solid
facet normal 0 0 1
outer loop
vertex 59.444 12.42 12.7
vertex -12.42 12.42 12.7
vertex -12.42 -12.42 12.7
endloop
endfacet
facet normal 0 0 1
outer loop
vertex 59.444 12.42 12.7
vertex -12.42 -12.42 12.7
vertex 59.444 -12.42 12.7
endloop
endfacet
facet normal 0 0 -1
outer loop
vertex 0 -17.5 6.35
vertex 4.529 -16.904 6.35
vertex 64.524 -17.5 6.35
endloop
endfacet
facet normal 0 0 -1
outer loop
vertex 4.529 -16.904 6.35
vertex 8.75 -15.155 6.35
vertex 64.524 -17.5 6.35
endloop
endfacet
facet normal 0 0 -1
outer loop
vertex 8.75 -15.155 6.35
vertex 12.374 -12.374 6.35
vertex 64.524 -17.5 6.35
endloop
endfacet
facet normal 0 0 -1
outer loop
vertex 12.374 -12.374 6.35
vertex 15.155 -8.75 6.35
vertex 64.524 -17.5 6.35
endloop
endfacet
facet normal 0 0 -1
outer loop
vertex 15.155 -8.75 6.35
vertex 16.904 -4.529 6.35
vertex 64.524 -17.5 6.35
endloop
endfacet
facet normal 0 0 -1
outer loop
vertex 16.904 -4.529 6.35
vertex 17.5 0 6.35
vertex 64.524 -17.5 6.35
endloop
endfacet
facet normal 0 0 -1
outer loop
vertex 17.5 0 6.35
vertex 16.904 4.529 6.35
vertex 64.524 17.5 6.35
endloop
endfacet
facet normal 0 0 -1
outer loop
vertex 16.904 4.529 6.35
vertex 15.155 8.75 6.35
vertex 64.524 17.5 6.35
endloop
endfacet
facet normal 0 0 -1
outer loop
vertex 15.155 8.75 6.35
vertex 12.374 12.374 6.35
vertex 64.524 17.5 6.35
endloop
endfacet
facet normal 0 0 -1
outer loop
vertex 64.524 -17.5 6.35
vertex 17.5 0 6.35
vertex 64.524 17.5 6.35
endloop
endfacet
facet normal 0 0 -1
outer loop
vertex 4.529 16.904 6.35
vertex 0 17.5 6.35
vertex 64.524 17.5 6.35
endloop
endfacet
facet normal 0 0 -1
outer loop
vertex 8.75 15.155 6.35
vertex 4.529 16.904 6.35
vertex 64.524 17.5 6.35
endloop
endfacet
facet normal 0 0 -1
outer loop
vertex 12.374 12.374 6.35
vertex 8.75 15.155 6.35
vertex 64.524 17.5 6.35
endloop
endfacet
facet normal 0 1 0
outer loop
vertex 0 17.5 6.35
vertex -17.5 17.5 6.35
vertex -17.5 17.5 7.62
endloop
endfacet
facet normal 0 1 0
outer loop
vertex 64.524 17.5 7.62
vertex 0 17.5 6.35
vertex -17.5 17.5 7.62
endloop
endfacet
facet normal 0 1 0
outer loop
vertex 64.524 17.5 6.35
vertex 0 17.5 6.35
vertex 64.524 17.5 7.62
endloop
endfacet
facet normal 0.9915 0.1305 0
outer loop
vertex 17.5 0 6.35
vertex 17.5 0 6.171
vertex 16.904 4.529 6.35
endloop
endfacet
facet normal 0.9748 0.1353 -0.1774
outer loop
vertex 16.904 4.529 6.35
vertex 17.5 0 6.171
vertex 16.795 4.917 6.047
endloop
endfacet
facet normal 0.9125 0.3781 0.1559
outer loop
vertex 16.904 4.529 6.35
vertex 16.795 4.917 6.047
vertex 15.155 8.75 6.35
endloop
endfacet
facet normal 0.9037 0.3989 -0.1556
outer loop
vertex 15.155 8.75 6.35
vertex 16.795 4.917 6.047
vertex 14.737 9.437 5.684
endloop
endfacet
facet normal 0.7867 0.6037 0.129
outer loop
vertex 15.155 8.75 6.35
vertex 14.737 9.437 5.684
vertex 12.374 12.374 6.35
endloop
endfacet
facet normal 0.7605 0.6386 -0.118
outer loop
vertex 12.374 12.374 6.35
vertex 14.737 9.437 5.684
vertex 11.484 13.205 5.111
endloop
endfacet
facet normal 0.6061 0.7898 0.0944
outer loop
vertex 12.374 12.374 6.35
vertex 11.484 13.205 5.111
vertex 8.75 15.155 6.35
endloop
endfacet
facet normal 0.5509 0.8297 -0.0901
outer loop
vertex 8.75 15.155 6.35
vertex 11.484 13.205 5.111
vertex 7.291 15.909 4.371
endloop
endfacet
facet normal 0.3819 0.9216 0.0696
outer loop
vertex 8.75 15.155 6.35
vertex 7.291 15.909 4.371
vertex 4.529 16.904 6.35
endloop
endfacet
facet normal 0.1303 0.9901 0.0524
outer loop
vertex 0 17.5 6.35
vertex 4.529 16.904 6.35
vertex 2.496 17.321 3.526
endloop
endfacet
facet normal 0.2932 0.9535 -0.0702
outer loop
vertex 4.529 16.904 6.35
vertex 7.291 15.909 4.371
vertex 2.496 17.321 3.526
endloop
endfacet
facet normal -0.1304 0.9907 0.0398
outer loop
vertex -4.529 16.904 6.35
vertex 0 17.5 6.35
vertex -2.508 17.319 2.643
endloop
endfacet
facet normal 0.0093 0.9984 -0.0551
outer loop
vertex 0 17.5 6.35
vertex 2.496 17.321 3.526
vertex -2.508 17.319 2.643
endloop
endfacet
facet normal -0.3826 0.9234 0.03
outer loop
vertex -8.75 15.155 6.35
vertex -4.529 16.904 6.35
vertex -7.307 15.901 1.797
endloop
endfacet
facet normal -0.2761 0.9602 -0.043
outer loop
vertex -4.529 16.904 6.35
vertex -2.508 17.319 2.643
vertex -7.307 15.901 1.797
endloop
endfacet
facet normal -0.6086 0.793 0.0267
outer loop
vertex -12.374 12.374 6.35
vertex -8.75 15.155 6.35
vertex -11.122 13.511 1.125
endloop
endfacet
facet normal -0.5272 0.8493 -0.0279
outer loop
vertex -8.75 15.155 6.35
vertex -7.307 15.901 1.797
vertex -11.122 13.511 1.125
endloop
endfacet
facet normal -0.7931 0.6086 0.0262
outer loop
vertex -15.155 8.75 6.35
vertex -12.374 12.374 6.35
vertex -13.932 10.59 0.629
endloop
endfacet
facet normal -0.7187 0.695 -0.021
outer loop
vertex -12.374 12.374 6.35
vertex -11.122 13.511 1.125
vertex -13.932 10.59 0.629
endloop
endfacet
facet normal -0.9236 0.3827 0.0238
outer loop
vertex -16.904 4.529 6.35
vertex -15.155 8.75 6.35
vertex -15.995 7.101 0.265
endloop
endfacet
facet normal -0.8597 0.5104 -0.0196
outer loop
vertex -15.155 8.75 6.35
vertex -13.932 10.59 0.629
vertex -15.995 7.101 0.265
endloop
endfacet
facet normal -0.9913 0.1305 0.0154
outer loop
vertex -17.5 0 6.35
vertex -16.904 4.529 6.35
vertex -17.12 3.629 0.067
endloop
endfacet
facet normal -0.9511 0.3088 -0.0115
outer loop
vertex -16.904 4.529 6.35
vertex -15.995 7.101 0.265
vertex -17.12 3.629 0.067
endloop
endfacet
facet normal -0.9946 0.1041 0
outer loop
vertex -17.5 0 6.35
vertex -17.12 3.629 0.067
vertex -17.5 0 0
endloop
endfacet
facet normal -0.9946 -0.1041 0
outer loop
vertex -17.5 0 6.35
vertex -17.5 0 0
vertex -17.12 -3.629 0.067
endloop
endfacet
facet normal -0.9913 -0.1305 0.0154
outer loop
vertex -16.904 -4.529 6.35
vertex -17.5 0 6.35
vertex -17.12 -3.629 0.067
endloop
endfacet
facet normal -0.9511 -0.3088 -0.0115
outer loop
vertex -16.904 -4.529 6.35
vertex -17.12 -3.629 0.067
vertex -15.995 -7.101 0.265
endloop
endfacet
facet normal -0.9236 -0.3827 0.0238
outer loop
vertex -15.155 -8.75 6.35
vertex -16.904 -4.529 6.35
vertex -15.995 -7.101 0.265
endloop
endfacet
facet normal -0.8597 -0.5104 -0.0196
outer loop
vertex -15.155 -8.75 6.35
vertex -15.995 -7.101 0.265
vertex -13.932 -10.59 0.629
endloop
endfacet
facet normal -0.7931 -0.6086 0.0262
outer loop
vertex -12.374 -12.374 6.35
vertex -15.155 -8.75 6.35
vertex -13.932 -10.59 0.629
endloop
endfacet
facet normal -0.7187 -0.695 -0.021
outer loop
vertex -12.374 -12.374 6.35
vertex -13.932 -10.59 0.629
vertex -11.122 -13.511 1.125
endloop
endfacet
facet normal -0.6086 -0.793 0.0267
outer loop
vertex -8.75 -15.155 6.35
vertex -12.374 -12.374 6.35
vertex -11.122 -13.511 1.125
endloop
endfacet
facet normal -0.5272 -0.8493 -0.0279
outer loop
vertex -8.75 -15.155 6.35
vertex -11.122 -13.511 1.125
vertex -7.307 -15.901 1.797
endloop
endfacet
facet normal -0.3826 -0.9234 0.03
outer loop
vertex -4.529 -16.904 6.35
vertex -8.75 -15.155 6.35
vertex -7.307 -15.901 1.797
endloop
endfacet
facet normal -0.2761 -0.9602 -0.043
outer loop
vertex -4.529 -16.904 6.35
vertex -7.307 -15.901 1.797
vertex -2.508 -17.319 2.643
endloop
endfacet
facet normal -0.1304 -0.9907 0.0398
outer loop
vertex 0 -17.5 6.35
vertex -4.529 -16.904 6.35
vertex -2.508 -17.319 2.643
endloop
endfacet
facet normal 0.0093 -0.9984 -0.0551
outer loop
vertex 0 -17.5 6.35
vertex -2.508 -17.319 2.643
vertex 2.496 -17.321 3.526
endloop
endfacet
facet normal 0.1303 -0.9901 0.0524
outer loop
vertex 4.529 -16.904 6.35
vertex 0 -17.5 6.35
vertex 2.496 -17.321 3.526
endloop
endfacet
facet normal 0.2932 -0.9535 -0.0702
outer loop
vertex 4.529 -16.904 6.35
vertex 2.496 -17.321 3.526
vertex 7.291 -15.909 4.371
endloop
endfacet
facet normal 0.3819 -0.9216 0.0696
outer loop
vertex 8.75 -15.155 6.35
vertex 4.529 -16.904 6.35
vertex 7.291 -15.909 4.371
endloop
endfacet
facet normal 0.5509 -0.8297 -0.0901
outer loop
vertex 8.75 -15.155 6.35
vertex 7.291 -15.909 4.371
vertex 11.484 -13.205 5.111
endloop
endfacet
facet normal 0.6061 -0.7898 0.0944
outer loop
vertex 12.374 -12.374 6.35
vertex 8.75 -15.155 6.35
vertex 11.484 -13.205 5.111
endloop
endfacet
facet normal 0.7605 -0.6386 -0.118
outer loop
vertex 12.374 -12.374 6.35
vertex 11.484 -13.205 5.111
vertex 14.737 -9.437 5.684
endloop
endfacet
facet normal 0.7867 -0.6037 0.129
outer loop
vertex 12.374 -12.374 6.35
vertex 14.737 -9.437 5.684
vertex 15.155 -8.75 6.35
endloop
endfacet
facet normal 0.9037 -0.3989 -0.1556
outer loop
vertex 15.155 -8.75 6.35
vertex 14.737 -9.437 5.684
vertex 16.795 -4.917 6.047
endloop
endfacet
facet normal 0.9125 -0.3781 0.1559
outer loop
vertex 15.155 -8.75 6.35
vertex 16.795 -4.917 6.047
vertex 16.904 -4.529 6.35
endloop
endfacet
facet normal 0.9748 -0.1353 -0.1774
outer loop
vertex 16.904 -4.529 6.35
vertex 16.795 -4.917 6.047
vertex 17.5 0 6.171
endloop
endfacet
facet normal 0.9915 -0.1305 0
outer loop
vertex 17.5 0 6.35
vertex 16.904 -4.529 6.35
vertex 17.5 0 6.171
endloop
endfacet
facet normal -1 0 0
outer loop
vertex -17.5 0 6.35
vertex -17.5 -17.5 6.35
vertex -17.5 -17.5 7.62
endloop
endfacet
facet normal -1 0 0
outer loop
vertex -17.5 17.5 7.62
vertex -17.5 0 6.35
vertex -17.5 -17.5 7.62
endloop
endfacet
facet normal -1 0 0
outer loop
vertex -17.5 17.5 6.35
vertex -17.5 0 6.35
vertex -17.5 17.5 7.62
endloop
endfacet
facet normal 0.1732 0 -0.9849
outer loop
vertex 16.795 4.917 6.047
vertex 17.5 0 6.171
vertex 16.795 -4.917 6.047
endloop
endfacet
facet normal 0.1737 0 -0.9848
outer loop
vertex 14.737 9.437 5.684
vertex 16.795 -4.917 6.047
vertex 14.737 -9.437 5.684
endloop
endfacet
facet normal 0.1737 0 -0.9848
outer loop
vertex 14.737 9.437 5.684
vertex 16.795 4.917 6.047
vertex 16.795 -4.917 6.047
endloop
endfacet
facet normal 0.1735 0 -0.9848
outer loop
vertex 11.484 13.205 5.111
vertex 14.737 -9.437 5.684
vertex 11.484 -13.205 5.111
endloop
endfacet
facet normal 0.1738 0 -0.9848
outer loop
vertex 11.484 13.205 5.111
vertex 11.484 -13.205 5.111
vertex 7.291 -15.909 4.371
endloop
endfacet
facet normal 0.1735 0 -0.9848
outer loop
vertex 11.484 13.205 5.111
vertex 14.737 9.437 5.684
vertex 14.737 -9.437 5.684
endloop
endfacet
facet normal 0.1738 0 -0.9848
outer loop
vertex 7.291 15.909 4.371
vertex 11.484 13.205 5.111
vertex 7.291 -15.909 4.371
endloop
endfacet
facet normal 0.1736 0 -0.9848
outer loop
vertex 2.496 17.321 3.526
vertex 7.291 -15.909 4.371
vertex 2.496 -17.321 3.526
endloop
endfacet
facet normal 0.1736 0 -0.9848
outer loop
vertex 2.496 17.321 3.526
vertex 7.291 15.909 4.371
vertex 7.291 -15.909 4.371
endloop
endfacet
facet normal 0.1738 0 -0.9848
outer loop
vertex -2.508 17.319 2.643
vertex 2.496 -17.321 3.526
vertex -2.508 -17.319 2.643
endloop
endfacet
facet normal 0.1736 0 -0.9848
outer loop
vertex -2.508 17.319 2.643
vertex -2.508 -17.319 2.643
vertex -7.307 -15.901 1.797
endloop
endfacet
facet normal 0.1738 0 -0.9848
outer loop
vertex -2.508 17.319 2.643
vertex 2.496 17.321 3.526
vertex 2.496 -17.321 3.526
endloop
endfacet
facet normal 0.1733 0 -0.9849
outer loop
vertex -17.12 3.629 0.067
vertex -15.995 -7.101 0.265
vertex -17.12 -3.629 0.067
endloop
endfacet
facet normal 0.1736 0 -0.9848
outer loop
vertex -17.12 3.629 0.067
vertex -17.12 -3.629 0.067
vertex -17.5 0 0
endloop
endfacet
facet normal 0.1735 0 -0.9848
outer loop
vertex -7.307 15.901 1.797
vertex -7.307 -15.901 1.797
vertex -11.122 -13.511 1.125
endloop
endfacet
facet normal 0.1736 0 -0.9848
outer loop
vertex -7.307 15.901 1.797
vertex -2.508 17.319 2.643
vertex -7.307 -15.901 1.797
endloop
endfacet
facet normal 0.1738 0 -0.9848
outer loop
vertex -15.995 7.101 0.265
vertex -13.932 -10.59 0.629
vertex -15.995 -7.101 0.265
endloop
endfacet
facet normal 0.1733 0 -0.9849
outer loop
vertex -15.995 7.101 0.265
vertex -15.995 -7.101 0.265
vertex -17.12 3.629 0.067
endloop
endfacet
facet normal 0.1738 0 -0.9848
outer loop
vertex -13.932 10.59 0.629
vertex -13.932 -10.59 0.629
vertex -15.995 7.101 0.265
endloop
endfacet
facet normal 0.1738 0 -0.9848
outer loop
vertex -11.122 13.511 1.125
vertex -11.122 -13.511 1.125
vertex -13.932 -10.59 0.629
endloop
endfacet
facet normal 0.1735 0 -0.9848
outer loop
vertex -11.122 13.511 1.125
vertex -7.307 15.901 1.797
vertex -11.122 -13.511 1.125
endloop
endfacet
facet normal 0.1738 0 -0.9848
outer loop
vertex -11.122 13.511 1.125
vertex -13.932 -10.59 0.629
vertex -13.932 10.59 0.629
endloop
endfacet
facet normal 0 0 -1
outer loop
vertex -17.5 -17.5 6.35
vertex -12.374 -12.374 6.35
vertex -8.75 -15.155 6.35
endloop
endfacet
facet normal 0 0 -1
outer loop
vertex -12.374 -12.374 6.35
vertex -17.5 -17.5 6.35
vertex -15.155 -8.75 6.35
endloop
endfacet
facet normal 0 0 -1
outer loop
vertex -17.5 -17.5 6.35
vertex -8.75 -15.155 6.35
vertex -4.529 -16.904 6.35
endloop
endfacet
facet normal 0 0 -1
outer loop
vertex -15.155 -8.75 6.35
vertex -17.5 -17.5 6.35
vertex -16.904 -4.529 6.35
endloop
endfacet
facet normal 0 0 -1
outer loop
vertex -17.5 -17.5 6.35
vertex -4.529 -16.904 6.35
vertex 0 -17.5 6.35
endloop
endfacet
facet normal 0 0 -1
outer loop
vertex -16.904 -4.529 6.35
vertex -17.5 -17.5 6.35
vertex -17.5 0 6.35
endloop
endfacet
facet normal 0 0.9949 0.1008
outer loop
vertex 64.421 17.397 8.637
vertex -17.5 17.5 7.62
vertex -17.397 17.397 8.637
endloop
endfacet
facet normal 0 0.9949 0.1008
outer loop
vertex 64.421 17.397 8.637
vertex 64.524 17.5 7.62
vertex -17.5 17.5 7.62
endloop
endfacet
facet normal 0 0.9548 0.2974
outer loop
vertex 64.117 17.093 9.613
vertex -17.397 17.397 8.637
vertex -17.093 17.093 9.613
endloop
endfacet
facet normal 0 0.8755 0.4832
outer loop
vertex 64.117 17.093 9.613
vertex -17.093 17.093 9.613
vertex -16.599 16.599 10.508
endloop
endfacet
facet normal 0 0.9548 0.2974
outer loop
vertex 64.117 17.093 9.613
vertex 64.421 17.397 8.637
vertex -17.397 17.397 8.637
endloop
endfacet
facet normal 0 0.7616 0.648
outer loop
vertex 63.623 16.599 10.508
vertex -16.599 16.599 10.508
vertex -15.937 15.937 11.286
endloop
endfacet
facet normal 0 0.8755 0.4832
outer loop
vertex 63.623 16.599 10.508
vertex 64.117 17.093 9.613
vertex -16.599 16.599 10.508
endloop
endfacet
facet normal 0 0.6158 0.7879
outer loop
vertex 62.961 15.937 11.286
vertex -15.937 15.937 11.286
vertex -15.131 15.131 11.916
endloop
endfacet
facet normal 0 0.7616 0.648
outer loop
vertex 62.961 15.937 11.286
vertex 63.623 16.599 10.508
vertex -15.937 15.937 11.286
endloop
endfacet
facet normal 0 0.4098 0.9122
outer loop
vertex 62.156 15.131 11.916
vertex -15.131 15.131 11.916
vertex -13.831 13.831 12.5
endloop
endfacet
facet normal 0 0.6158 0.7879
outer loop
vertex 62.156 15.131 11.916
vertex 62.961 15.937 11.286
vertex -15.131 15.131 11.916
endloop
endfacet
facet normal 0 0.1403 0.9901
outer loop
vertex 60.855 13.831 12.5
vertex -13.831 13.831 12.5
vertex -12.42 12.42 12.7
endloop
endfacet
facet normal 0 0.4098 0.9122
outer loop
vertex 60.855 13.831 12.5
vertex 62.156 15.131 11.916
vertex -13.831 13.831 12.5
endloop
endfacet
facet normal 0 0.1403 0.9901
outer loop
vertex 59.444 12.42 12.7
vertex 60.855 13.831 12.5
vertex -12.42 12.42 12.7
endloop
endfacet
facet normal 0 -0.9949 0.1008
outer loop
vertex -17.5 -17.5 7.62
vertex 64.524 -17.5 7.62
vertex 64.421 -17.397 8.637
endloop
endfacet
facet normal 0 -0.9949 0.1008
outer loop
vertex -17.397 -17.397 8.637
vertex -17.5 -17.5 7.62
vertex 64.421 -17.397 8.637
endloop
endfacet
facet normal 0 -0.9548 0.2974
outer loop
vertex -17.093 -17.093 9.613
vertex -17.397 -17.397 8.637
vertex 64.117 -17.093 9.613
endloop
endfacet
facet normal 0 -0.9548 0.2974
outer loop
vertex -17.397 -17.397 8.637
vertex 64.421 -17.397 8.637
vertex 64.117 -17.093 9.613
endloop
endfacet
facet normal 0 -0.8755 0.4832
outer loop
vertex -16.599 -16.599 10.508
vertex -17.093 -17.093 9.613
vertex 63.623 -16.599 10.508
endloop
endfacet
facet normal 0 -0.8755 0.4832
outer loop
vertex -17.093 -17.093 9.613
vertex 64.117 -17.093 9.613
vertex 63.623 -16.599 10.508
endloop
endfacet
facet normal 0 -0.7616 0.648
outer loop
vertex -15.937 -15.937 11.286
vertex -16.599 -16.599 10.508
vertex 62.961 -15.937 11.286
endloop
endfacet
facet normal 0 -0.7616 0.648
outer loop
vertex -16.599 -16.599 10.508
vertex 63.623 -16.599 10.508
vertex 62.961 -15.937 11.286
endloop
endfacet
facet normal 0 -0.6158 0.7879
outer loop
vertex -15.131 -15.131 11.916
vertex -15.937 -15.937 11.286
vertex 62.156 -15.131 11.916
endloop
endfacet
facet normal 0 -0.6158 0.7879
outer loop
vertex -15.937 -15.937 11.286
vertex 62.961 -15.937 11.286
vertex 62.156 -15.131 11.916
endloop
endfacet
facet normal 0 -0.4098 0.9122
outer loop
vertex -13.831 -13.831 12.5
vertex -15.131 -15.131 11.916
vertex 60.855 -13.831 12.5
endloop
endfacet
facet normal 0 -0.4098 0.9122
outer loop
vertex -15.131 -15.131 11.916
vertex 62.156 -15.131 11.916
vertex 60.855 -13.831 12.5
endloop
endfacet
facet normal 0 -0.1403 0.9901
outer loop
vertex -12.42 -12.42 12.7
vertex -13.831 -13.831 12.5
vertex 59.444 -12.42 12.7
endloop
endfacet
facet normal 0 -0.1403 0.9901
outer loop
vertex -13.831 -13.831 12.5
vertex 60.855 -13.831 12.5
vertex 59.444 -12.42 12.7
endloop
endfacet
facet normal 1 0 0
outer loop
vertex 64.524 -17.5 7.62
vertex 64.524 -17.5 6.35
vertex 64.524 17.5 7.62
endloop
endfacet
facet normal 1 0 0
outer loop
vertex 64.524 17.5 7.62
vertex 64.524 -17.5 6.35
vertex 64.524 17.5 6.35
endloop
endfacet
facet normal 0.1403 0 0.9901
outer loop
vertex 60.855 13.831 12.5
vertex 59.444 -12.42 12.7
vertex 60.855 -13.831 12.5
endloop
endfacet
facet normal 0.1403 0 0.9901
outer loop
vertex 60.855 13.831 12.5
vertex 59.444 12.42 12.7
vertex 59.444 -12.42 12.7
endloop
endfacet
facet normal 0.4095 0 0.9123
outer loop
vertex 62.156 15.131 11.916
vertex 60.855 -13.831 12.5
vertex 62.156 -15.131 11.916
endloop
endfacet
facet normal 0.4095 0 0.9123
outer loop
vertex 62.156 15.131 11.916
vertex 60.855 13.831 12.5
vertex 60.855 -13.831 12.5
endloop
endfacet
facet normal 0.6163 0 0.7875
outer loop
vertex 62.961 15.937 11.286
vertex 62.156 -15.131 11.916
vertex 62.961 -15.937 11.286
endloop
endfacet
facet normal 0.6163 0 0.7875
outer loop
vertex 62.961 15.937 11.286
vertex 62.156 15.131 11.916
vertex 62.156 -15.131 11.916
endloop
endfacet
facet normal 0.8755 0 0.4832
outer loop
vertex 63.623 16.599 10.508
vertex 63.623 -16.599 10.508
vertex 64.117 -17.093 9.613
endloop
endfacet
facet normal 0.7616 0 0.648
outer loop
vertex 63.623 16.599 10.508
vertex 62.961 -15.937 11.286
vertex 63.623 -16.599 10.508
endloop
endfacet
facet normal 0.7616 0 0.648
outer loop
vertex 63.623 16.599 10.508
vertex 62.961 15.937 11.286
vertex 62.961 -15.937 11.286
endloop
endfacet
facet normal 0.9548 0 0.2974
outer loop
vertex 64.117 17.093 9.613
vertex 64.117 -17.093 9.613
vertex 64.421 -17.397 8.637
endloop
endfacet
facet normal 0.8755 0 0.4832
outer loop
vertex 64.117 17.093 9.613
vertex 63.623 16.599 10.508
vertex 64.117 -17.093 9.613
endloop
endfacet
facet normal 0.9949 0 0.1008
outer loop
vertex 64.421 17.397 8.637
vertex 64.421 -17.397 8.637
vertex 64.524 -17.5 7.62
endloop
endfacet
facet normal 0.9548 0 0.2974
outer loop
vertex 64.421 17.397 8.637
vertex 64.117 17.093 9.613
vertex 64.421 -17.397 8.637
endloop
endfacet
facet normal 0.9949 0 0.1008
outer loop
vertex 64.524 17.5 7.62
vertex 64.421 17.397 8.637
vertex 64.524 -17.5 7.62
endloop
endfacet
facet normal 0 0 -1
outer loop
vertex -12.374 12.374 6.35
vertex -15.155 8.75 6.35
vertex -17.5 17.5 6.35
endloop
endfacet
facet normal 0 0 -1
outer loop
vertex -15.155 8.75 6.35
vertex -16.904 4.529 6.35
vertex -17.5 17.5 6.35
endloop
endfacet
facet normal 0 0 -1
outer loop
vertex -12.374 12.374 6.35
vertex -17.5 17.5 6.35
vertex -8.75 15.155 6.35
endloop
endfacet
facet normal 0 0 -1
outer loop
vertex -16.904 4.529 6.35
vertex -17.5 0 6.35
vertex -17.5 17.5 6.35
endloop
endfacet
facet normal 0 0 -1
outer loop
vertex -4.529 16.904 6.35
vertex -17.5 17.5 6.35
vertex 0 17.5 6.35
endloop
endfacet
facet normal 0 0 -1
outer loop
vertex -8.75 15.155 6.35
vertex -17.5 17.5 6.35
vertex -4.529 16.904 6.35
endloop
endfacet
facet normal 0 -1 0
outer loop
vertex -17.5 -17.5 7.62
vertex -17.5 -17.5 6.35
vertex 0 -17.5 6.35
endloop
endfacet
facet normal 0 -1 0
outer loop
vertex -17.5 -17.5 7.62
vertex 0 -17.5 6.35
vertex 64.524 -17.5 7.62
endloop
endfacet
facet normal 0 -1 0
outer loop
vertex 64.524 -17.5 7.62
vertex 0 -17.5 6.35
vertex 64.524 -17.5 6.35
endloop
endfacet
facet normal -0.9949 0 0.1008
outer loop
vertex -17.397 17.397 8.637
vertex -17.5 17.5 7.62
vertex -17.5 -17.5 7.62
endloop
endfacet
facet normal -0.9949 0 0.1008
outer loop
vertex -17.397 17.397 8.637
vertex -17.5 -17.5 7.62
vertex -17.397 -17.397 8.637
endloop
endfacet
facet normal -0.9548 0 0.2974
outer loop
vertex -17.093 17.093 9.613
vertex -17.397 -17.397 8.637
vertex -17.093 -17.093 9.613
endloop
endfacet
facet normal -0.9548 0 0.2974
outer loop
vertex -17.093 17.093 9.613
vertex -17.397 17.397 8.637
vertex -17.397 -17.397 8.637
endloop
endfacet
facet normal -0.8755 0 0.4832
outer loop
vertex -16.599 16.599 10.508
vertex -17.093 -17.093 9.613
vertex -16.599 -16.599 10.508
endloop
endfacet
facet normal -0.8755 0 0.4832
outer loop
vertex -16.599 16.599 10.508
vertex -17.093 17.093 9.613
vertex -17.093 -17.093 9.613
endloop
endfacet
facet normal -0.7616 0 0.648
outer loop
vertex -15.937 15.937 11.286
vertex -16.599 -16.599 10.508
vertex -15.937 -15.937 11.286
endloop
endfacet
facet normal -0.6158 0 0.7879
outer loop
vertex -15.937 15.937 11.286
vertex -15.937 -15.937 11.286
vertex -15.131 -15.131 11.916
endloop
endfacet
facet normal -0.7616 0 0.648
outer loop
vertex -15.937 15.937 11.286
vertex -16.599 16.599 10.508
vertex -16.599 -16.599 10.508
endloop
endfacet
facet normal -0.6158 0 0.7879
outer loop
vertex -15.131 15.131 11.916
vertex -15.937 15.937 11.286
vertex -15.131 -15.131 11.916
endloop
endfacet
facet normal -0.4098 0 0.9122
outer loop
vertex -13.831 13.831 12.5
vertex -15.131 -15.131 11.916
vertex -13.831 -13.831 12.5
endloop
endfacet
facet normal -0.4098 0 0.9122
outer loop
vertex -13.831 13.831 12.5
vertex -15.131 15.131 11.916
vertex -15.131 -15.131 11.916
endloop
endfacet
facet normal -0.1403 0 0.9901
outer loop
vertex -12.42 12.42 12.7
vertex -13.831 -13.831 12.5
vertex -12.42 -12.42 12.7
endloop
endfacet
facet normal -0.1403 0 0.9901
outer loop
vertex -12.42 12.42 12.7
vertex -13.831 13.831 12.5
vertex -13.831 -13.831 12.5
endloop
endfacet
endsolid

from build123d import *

# Parameters (mm, degrees)
F0_R          = 17.5
F1_DEPTH      = 6.35
F3_DEPTH      = 25.4
F3_DEPTH_BACK = 25.4
F4_W          = 82.024196
F4_H          = 35
F5_DEPTH      = 6.35
F6_R          = 5.08


with BuildPart() as f1:
    # F0 (on Top) → F1 (new body)
    with BuildSketch(Plane.XY):
        Circle(F0_R)
    extrude(amount=F1_DEPTH)

    # F2 (on Front) → F3 (cut, two sides)
    with BuildSketch(Plane.XZ) as f3_sk:
        Polygon((-17.5, 0), (0, 0), (17.5, 0), (17.5, 6.171444), align=None)
    extrude(amount=F3_DEPTH, mode=Mode.SUBTRACT)
    extrude(f3_sk.sketch, amount=-F3_DEPTH_BACK, mode=Mode.SUBTRACT)

    # F4 (on face) → F5 (join)
    with BuildSketch(Plane.XY.offset(6.35)):
        with Locations((23.512098, 0)):
            Rectangle(F4_W, F4_H)
    extrude(amount=F5_DEPTH)

    # F6
    f6_edges = [f1.edges().sort_by_distance(p)[0] for p in [
        (23.512098, 17.5, 12.7),
        (-17.5, 0, 12.7),
        (23.512098, -17.5, 12.7),
        (64.524196, 0, 12.7),
    ]]
    fillet(f6_edges, radius=F6_R)


solid = f1.part
